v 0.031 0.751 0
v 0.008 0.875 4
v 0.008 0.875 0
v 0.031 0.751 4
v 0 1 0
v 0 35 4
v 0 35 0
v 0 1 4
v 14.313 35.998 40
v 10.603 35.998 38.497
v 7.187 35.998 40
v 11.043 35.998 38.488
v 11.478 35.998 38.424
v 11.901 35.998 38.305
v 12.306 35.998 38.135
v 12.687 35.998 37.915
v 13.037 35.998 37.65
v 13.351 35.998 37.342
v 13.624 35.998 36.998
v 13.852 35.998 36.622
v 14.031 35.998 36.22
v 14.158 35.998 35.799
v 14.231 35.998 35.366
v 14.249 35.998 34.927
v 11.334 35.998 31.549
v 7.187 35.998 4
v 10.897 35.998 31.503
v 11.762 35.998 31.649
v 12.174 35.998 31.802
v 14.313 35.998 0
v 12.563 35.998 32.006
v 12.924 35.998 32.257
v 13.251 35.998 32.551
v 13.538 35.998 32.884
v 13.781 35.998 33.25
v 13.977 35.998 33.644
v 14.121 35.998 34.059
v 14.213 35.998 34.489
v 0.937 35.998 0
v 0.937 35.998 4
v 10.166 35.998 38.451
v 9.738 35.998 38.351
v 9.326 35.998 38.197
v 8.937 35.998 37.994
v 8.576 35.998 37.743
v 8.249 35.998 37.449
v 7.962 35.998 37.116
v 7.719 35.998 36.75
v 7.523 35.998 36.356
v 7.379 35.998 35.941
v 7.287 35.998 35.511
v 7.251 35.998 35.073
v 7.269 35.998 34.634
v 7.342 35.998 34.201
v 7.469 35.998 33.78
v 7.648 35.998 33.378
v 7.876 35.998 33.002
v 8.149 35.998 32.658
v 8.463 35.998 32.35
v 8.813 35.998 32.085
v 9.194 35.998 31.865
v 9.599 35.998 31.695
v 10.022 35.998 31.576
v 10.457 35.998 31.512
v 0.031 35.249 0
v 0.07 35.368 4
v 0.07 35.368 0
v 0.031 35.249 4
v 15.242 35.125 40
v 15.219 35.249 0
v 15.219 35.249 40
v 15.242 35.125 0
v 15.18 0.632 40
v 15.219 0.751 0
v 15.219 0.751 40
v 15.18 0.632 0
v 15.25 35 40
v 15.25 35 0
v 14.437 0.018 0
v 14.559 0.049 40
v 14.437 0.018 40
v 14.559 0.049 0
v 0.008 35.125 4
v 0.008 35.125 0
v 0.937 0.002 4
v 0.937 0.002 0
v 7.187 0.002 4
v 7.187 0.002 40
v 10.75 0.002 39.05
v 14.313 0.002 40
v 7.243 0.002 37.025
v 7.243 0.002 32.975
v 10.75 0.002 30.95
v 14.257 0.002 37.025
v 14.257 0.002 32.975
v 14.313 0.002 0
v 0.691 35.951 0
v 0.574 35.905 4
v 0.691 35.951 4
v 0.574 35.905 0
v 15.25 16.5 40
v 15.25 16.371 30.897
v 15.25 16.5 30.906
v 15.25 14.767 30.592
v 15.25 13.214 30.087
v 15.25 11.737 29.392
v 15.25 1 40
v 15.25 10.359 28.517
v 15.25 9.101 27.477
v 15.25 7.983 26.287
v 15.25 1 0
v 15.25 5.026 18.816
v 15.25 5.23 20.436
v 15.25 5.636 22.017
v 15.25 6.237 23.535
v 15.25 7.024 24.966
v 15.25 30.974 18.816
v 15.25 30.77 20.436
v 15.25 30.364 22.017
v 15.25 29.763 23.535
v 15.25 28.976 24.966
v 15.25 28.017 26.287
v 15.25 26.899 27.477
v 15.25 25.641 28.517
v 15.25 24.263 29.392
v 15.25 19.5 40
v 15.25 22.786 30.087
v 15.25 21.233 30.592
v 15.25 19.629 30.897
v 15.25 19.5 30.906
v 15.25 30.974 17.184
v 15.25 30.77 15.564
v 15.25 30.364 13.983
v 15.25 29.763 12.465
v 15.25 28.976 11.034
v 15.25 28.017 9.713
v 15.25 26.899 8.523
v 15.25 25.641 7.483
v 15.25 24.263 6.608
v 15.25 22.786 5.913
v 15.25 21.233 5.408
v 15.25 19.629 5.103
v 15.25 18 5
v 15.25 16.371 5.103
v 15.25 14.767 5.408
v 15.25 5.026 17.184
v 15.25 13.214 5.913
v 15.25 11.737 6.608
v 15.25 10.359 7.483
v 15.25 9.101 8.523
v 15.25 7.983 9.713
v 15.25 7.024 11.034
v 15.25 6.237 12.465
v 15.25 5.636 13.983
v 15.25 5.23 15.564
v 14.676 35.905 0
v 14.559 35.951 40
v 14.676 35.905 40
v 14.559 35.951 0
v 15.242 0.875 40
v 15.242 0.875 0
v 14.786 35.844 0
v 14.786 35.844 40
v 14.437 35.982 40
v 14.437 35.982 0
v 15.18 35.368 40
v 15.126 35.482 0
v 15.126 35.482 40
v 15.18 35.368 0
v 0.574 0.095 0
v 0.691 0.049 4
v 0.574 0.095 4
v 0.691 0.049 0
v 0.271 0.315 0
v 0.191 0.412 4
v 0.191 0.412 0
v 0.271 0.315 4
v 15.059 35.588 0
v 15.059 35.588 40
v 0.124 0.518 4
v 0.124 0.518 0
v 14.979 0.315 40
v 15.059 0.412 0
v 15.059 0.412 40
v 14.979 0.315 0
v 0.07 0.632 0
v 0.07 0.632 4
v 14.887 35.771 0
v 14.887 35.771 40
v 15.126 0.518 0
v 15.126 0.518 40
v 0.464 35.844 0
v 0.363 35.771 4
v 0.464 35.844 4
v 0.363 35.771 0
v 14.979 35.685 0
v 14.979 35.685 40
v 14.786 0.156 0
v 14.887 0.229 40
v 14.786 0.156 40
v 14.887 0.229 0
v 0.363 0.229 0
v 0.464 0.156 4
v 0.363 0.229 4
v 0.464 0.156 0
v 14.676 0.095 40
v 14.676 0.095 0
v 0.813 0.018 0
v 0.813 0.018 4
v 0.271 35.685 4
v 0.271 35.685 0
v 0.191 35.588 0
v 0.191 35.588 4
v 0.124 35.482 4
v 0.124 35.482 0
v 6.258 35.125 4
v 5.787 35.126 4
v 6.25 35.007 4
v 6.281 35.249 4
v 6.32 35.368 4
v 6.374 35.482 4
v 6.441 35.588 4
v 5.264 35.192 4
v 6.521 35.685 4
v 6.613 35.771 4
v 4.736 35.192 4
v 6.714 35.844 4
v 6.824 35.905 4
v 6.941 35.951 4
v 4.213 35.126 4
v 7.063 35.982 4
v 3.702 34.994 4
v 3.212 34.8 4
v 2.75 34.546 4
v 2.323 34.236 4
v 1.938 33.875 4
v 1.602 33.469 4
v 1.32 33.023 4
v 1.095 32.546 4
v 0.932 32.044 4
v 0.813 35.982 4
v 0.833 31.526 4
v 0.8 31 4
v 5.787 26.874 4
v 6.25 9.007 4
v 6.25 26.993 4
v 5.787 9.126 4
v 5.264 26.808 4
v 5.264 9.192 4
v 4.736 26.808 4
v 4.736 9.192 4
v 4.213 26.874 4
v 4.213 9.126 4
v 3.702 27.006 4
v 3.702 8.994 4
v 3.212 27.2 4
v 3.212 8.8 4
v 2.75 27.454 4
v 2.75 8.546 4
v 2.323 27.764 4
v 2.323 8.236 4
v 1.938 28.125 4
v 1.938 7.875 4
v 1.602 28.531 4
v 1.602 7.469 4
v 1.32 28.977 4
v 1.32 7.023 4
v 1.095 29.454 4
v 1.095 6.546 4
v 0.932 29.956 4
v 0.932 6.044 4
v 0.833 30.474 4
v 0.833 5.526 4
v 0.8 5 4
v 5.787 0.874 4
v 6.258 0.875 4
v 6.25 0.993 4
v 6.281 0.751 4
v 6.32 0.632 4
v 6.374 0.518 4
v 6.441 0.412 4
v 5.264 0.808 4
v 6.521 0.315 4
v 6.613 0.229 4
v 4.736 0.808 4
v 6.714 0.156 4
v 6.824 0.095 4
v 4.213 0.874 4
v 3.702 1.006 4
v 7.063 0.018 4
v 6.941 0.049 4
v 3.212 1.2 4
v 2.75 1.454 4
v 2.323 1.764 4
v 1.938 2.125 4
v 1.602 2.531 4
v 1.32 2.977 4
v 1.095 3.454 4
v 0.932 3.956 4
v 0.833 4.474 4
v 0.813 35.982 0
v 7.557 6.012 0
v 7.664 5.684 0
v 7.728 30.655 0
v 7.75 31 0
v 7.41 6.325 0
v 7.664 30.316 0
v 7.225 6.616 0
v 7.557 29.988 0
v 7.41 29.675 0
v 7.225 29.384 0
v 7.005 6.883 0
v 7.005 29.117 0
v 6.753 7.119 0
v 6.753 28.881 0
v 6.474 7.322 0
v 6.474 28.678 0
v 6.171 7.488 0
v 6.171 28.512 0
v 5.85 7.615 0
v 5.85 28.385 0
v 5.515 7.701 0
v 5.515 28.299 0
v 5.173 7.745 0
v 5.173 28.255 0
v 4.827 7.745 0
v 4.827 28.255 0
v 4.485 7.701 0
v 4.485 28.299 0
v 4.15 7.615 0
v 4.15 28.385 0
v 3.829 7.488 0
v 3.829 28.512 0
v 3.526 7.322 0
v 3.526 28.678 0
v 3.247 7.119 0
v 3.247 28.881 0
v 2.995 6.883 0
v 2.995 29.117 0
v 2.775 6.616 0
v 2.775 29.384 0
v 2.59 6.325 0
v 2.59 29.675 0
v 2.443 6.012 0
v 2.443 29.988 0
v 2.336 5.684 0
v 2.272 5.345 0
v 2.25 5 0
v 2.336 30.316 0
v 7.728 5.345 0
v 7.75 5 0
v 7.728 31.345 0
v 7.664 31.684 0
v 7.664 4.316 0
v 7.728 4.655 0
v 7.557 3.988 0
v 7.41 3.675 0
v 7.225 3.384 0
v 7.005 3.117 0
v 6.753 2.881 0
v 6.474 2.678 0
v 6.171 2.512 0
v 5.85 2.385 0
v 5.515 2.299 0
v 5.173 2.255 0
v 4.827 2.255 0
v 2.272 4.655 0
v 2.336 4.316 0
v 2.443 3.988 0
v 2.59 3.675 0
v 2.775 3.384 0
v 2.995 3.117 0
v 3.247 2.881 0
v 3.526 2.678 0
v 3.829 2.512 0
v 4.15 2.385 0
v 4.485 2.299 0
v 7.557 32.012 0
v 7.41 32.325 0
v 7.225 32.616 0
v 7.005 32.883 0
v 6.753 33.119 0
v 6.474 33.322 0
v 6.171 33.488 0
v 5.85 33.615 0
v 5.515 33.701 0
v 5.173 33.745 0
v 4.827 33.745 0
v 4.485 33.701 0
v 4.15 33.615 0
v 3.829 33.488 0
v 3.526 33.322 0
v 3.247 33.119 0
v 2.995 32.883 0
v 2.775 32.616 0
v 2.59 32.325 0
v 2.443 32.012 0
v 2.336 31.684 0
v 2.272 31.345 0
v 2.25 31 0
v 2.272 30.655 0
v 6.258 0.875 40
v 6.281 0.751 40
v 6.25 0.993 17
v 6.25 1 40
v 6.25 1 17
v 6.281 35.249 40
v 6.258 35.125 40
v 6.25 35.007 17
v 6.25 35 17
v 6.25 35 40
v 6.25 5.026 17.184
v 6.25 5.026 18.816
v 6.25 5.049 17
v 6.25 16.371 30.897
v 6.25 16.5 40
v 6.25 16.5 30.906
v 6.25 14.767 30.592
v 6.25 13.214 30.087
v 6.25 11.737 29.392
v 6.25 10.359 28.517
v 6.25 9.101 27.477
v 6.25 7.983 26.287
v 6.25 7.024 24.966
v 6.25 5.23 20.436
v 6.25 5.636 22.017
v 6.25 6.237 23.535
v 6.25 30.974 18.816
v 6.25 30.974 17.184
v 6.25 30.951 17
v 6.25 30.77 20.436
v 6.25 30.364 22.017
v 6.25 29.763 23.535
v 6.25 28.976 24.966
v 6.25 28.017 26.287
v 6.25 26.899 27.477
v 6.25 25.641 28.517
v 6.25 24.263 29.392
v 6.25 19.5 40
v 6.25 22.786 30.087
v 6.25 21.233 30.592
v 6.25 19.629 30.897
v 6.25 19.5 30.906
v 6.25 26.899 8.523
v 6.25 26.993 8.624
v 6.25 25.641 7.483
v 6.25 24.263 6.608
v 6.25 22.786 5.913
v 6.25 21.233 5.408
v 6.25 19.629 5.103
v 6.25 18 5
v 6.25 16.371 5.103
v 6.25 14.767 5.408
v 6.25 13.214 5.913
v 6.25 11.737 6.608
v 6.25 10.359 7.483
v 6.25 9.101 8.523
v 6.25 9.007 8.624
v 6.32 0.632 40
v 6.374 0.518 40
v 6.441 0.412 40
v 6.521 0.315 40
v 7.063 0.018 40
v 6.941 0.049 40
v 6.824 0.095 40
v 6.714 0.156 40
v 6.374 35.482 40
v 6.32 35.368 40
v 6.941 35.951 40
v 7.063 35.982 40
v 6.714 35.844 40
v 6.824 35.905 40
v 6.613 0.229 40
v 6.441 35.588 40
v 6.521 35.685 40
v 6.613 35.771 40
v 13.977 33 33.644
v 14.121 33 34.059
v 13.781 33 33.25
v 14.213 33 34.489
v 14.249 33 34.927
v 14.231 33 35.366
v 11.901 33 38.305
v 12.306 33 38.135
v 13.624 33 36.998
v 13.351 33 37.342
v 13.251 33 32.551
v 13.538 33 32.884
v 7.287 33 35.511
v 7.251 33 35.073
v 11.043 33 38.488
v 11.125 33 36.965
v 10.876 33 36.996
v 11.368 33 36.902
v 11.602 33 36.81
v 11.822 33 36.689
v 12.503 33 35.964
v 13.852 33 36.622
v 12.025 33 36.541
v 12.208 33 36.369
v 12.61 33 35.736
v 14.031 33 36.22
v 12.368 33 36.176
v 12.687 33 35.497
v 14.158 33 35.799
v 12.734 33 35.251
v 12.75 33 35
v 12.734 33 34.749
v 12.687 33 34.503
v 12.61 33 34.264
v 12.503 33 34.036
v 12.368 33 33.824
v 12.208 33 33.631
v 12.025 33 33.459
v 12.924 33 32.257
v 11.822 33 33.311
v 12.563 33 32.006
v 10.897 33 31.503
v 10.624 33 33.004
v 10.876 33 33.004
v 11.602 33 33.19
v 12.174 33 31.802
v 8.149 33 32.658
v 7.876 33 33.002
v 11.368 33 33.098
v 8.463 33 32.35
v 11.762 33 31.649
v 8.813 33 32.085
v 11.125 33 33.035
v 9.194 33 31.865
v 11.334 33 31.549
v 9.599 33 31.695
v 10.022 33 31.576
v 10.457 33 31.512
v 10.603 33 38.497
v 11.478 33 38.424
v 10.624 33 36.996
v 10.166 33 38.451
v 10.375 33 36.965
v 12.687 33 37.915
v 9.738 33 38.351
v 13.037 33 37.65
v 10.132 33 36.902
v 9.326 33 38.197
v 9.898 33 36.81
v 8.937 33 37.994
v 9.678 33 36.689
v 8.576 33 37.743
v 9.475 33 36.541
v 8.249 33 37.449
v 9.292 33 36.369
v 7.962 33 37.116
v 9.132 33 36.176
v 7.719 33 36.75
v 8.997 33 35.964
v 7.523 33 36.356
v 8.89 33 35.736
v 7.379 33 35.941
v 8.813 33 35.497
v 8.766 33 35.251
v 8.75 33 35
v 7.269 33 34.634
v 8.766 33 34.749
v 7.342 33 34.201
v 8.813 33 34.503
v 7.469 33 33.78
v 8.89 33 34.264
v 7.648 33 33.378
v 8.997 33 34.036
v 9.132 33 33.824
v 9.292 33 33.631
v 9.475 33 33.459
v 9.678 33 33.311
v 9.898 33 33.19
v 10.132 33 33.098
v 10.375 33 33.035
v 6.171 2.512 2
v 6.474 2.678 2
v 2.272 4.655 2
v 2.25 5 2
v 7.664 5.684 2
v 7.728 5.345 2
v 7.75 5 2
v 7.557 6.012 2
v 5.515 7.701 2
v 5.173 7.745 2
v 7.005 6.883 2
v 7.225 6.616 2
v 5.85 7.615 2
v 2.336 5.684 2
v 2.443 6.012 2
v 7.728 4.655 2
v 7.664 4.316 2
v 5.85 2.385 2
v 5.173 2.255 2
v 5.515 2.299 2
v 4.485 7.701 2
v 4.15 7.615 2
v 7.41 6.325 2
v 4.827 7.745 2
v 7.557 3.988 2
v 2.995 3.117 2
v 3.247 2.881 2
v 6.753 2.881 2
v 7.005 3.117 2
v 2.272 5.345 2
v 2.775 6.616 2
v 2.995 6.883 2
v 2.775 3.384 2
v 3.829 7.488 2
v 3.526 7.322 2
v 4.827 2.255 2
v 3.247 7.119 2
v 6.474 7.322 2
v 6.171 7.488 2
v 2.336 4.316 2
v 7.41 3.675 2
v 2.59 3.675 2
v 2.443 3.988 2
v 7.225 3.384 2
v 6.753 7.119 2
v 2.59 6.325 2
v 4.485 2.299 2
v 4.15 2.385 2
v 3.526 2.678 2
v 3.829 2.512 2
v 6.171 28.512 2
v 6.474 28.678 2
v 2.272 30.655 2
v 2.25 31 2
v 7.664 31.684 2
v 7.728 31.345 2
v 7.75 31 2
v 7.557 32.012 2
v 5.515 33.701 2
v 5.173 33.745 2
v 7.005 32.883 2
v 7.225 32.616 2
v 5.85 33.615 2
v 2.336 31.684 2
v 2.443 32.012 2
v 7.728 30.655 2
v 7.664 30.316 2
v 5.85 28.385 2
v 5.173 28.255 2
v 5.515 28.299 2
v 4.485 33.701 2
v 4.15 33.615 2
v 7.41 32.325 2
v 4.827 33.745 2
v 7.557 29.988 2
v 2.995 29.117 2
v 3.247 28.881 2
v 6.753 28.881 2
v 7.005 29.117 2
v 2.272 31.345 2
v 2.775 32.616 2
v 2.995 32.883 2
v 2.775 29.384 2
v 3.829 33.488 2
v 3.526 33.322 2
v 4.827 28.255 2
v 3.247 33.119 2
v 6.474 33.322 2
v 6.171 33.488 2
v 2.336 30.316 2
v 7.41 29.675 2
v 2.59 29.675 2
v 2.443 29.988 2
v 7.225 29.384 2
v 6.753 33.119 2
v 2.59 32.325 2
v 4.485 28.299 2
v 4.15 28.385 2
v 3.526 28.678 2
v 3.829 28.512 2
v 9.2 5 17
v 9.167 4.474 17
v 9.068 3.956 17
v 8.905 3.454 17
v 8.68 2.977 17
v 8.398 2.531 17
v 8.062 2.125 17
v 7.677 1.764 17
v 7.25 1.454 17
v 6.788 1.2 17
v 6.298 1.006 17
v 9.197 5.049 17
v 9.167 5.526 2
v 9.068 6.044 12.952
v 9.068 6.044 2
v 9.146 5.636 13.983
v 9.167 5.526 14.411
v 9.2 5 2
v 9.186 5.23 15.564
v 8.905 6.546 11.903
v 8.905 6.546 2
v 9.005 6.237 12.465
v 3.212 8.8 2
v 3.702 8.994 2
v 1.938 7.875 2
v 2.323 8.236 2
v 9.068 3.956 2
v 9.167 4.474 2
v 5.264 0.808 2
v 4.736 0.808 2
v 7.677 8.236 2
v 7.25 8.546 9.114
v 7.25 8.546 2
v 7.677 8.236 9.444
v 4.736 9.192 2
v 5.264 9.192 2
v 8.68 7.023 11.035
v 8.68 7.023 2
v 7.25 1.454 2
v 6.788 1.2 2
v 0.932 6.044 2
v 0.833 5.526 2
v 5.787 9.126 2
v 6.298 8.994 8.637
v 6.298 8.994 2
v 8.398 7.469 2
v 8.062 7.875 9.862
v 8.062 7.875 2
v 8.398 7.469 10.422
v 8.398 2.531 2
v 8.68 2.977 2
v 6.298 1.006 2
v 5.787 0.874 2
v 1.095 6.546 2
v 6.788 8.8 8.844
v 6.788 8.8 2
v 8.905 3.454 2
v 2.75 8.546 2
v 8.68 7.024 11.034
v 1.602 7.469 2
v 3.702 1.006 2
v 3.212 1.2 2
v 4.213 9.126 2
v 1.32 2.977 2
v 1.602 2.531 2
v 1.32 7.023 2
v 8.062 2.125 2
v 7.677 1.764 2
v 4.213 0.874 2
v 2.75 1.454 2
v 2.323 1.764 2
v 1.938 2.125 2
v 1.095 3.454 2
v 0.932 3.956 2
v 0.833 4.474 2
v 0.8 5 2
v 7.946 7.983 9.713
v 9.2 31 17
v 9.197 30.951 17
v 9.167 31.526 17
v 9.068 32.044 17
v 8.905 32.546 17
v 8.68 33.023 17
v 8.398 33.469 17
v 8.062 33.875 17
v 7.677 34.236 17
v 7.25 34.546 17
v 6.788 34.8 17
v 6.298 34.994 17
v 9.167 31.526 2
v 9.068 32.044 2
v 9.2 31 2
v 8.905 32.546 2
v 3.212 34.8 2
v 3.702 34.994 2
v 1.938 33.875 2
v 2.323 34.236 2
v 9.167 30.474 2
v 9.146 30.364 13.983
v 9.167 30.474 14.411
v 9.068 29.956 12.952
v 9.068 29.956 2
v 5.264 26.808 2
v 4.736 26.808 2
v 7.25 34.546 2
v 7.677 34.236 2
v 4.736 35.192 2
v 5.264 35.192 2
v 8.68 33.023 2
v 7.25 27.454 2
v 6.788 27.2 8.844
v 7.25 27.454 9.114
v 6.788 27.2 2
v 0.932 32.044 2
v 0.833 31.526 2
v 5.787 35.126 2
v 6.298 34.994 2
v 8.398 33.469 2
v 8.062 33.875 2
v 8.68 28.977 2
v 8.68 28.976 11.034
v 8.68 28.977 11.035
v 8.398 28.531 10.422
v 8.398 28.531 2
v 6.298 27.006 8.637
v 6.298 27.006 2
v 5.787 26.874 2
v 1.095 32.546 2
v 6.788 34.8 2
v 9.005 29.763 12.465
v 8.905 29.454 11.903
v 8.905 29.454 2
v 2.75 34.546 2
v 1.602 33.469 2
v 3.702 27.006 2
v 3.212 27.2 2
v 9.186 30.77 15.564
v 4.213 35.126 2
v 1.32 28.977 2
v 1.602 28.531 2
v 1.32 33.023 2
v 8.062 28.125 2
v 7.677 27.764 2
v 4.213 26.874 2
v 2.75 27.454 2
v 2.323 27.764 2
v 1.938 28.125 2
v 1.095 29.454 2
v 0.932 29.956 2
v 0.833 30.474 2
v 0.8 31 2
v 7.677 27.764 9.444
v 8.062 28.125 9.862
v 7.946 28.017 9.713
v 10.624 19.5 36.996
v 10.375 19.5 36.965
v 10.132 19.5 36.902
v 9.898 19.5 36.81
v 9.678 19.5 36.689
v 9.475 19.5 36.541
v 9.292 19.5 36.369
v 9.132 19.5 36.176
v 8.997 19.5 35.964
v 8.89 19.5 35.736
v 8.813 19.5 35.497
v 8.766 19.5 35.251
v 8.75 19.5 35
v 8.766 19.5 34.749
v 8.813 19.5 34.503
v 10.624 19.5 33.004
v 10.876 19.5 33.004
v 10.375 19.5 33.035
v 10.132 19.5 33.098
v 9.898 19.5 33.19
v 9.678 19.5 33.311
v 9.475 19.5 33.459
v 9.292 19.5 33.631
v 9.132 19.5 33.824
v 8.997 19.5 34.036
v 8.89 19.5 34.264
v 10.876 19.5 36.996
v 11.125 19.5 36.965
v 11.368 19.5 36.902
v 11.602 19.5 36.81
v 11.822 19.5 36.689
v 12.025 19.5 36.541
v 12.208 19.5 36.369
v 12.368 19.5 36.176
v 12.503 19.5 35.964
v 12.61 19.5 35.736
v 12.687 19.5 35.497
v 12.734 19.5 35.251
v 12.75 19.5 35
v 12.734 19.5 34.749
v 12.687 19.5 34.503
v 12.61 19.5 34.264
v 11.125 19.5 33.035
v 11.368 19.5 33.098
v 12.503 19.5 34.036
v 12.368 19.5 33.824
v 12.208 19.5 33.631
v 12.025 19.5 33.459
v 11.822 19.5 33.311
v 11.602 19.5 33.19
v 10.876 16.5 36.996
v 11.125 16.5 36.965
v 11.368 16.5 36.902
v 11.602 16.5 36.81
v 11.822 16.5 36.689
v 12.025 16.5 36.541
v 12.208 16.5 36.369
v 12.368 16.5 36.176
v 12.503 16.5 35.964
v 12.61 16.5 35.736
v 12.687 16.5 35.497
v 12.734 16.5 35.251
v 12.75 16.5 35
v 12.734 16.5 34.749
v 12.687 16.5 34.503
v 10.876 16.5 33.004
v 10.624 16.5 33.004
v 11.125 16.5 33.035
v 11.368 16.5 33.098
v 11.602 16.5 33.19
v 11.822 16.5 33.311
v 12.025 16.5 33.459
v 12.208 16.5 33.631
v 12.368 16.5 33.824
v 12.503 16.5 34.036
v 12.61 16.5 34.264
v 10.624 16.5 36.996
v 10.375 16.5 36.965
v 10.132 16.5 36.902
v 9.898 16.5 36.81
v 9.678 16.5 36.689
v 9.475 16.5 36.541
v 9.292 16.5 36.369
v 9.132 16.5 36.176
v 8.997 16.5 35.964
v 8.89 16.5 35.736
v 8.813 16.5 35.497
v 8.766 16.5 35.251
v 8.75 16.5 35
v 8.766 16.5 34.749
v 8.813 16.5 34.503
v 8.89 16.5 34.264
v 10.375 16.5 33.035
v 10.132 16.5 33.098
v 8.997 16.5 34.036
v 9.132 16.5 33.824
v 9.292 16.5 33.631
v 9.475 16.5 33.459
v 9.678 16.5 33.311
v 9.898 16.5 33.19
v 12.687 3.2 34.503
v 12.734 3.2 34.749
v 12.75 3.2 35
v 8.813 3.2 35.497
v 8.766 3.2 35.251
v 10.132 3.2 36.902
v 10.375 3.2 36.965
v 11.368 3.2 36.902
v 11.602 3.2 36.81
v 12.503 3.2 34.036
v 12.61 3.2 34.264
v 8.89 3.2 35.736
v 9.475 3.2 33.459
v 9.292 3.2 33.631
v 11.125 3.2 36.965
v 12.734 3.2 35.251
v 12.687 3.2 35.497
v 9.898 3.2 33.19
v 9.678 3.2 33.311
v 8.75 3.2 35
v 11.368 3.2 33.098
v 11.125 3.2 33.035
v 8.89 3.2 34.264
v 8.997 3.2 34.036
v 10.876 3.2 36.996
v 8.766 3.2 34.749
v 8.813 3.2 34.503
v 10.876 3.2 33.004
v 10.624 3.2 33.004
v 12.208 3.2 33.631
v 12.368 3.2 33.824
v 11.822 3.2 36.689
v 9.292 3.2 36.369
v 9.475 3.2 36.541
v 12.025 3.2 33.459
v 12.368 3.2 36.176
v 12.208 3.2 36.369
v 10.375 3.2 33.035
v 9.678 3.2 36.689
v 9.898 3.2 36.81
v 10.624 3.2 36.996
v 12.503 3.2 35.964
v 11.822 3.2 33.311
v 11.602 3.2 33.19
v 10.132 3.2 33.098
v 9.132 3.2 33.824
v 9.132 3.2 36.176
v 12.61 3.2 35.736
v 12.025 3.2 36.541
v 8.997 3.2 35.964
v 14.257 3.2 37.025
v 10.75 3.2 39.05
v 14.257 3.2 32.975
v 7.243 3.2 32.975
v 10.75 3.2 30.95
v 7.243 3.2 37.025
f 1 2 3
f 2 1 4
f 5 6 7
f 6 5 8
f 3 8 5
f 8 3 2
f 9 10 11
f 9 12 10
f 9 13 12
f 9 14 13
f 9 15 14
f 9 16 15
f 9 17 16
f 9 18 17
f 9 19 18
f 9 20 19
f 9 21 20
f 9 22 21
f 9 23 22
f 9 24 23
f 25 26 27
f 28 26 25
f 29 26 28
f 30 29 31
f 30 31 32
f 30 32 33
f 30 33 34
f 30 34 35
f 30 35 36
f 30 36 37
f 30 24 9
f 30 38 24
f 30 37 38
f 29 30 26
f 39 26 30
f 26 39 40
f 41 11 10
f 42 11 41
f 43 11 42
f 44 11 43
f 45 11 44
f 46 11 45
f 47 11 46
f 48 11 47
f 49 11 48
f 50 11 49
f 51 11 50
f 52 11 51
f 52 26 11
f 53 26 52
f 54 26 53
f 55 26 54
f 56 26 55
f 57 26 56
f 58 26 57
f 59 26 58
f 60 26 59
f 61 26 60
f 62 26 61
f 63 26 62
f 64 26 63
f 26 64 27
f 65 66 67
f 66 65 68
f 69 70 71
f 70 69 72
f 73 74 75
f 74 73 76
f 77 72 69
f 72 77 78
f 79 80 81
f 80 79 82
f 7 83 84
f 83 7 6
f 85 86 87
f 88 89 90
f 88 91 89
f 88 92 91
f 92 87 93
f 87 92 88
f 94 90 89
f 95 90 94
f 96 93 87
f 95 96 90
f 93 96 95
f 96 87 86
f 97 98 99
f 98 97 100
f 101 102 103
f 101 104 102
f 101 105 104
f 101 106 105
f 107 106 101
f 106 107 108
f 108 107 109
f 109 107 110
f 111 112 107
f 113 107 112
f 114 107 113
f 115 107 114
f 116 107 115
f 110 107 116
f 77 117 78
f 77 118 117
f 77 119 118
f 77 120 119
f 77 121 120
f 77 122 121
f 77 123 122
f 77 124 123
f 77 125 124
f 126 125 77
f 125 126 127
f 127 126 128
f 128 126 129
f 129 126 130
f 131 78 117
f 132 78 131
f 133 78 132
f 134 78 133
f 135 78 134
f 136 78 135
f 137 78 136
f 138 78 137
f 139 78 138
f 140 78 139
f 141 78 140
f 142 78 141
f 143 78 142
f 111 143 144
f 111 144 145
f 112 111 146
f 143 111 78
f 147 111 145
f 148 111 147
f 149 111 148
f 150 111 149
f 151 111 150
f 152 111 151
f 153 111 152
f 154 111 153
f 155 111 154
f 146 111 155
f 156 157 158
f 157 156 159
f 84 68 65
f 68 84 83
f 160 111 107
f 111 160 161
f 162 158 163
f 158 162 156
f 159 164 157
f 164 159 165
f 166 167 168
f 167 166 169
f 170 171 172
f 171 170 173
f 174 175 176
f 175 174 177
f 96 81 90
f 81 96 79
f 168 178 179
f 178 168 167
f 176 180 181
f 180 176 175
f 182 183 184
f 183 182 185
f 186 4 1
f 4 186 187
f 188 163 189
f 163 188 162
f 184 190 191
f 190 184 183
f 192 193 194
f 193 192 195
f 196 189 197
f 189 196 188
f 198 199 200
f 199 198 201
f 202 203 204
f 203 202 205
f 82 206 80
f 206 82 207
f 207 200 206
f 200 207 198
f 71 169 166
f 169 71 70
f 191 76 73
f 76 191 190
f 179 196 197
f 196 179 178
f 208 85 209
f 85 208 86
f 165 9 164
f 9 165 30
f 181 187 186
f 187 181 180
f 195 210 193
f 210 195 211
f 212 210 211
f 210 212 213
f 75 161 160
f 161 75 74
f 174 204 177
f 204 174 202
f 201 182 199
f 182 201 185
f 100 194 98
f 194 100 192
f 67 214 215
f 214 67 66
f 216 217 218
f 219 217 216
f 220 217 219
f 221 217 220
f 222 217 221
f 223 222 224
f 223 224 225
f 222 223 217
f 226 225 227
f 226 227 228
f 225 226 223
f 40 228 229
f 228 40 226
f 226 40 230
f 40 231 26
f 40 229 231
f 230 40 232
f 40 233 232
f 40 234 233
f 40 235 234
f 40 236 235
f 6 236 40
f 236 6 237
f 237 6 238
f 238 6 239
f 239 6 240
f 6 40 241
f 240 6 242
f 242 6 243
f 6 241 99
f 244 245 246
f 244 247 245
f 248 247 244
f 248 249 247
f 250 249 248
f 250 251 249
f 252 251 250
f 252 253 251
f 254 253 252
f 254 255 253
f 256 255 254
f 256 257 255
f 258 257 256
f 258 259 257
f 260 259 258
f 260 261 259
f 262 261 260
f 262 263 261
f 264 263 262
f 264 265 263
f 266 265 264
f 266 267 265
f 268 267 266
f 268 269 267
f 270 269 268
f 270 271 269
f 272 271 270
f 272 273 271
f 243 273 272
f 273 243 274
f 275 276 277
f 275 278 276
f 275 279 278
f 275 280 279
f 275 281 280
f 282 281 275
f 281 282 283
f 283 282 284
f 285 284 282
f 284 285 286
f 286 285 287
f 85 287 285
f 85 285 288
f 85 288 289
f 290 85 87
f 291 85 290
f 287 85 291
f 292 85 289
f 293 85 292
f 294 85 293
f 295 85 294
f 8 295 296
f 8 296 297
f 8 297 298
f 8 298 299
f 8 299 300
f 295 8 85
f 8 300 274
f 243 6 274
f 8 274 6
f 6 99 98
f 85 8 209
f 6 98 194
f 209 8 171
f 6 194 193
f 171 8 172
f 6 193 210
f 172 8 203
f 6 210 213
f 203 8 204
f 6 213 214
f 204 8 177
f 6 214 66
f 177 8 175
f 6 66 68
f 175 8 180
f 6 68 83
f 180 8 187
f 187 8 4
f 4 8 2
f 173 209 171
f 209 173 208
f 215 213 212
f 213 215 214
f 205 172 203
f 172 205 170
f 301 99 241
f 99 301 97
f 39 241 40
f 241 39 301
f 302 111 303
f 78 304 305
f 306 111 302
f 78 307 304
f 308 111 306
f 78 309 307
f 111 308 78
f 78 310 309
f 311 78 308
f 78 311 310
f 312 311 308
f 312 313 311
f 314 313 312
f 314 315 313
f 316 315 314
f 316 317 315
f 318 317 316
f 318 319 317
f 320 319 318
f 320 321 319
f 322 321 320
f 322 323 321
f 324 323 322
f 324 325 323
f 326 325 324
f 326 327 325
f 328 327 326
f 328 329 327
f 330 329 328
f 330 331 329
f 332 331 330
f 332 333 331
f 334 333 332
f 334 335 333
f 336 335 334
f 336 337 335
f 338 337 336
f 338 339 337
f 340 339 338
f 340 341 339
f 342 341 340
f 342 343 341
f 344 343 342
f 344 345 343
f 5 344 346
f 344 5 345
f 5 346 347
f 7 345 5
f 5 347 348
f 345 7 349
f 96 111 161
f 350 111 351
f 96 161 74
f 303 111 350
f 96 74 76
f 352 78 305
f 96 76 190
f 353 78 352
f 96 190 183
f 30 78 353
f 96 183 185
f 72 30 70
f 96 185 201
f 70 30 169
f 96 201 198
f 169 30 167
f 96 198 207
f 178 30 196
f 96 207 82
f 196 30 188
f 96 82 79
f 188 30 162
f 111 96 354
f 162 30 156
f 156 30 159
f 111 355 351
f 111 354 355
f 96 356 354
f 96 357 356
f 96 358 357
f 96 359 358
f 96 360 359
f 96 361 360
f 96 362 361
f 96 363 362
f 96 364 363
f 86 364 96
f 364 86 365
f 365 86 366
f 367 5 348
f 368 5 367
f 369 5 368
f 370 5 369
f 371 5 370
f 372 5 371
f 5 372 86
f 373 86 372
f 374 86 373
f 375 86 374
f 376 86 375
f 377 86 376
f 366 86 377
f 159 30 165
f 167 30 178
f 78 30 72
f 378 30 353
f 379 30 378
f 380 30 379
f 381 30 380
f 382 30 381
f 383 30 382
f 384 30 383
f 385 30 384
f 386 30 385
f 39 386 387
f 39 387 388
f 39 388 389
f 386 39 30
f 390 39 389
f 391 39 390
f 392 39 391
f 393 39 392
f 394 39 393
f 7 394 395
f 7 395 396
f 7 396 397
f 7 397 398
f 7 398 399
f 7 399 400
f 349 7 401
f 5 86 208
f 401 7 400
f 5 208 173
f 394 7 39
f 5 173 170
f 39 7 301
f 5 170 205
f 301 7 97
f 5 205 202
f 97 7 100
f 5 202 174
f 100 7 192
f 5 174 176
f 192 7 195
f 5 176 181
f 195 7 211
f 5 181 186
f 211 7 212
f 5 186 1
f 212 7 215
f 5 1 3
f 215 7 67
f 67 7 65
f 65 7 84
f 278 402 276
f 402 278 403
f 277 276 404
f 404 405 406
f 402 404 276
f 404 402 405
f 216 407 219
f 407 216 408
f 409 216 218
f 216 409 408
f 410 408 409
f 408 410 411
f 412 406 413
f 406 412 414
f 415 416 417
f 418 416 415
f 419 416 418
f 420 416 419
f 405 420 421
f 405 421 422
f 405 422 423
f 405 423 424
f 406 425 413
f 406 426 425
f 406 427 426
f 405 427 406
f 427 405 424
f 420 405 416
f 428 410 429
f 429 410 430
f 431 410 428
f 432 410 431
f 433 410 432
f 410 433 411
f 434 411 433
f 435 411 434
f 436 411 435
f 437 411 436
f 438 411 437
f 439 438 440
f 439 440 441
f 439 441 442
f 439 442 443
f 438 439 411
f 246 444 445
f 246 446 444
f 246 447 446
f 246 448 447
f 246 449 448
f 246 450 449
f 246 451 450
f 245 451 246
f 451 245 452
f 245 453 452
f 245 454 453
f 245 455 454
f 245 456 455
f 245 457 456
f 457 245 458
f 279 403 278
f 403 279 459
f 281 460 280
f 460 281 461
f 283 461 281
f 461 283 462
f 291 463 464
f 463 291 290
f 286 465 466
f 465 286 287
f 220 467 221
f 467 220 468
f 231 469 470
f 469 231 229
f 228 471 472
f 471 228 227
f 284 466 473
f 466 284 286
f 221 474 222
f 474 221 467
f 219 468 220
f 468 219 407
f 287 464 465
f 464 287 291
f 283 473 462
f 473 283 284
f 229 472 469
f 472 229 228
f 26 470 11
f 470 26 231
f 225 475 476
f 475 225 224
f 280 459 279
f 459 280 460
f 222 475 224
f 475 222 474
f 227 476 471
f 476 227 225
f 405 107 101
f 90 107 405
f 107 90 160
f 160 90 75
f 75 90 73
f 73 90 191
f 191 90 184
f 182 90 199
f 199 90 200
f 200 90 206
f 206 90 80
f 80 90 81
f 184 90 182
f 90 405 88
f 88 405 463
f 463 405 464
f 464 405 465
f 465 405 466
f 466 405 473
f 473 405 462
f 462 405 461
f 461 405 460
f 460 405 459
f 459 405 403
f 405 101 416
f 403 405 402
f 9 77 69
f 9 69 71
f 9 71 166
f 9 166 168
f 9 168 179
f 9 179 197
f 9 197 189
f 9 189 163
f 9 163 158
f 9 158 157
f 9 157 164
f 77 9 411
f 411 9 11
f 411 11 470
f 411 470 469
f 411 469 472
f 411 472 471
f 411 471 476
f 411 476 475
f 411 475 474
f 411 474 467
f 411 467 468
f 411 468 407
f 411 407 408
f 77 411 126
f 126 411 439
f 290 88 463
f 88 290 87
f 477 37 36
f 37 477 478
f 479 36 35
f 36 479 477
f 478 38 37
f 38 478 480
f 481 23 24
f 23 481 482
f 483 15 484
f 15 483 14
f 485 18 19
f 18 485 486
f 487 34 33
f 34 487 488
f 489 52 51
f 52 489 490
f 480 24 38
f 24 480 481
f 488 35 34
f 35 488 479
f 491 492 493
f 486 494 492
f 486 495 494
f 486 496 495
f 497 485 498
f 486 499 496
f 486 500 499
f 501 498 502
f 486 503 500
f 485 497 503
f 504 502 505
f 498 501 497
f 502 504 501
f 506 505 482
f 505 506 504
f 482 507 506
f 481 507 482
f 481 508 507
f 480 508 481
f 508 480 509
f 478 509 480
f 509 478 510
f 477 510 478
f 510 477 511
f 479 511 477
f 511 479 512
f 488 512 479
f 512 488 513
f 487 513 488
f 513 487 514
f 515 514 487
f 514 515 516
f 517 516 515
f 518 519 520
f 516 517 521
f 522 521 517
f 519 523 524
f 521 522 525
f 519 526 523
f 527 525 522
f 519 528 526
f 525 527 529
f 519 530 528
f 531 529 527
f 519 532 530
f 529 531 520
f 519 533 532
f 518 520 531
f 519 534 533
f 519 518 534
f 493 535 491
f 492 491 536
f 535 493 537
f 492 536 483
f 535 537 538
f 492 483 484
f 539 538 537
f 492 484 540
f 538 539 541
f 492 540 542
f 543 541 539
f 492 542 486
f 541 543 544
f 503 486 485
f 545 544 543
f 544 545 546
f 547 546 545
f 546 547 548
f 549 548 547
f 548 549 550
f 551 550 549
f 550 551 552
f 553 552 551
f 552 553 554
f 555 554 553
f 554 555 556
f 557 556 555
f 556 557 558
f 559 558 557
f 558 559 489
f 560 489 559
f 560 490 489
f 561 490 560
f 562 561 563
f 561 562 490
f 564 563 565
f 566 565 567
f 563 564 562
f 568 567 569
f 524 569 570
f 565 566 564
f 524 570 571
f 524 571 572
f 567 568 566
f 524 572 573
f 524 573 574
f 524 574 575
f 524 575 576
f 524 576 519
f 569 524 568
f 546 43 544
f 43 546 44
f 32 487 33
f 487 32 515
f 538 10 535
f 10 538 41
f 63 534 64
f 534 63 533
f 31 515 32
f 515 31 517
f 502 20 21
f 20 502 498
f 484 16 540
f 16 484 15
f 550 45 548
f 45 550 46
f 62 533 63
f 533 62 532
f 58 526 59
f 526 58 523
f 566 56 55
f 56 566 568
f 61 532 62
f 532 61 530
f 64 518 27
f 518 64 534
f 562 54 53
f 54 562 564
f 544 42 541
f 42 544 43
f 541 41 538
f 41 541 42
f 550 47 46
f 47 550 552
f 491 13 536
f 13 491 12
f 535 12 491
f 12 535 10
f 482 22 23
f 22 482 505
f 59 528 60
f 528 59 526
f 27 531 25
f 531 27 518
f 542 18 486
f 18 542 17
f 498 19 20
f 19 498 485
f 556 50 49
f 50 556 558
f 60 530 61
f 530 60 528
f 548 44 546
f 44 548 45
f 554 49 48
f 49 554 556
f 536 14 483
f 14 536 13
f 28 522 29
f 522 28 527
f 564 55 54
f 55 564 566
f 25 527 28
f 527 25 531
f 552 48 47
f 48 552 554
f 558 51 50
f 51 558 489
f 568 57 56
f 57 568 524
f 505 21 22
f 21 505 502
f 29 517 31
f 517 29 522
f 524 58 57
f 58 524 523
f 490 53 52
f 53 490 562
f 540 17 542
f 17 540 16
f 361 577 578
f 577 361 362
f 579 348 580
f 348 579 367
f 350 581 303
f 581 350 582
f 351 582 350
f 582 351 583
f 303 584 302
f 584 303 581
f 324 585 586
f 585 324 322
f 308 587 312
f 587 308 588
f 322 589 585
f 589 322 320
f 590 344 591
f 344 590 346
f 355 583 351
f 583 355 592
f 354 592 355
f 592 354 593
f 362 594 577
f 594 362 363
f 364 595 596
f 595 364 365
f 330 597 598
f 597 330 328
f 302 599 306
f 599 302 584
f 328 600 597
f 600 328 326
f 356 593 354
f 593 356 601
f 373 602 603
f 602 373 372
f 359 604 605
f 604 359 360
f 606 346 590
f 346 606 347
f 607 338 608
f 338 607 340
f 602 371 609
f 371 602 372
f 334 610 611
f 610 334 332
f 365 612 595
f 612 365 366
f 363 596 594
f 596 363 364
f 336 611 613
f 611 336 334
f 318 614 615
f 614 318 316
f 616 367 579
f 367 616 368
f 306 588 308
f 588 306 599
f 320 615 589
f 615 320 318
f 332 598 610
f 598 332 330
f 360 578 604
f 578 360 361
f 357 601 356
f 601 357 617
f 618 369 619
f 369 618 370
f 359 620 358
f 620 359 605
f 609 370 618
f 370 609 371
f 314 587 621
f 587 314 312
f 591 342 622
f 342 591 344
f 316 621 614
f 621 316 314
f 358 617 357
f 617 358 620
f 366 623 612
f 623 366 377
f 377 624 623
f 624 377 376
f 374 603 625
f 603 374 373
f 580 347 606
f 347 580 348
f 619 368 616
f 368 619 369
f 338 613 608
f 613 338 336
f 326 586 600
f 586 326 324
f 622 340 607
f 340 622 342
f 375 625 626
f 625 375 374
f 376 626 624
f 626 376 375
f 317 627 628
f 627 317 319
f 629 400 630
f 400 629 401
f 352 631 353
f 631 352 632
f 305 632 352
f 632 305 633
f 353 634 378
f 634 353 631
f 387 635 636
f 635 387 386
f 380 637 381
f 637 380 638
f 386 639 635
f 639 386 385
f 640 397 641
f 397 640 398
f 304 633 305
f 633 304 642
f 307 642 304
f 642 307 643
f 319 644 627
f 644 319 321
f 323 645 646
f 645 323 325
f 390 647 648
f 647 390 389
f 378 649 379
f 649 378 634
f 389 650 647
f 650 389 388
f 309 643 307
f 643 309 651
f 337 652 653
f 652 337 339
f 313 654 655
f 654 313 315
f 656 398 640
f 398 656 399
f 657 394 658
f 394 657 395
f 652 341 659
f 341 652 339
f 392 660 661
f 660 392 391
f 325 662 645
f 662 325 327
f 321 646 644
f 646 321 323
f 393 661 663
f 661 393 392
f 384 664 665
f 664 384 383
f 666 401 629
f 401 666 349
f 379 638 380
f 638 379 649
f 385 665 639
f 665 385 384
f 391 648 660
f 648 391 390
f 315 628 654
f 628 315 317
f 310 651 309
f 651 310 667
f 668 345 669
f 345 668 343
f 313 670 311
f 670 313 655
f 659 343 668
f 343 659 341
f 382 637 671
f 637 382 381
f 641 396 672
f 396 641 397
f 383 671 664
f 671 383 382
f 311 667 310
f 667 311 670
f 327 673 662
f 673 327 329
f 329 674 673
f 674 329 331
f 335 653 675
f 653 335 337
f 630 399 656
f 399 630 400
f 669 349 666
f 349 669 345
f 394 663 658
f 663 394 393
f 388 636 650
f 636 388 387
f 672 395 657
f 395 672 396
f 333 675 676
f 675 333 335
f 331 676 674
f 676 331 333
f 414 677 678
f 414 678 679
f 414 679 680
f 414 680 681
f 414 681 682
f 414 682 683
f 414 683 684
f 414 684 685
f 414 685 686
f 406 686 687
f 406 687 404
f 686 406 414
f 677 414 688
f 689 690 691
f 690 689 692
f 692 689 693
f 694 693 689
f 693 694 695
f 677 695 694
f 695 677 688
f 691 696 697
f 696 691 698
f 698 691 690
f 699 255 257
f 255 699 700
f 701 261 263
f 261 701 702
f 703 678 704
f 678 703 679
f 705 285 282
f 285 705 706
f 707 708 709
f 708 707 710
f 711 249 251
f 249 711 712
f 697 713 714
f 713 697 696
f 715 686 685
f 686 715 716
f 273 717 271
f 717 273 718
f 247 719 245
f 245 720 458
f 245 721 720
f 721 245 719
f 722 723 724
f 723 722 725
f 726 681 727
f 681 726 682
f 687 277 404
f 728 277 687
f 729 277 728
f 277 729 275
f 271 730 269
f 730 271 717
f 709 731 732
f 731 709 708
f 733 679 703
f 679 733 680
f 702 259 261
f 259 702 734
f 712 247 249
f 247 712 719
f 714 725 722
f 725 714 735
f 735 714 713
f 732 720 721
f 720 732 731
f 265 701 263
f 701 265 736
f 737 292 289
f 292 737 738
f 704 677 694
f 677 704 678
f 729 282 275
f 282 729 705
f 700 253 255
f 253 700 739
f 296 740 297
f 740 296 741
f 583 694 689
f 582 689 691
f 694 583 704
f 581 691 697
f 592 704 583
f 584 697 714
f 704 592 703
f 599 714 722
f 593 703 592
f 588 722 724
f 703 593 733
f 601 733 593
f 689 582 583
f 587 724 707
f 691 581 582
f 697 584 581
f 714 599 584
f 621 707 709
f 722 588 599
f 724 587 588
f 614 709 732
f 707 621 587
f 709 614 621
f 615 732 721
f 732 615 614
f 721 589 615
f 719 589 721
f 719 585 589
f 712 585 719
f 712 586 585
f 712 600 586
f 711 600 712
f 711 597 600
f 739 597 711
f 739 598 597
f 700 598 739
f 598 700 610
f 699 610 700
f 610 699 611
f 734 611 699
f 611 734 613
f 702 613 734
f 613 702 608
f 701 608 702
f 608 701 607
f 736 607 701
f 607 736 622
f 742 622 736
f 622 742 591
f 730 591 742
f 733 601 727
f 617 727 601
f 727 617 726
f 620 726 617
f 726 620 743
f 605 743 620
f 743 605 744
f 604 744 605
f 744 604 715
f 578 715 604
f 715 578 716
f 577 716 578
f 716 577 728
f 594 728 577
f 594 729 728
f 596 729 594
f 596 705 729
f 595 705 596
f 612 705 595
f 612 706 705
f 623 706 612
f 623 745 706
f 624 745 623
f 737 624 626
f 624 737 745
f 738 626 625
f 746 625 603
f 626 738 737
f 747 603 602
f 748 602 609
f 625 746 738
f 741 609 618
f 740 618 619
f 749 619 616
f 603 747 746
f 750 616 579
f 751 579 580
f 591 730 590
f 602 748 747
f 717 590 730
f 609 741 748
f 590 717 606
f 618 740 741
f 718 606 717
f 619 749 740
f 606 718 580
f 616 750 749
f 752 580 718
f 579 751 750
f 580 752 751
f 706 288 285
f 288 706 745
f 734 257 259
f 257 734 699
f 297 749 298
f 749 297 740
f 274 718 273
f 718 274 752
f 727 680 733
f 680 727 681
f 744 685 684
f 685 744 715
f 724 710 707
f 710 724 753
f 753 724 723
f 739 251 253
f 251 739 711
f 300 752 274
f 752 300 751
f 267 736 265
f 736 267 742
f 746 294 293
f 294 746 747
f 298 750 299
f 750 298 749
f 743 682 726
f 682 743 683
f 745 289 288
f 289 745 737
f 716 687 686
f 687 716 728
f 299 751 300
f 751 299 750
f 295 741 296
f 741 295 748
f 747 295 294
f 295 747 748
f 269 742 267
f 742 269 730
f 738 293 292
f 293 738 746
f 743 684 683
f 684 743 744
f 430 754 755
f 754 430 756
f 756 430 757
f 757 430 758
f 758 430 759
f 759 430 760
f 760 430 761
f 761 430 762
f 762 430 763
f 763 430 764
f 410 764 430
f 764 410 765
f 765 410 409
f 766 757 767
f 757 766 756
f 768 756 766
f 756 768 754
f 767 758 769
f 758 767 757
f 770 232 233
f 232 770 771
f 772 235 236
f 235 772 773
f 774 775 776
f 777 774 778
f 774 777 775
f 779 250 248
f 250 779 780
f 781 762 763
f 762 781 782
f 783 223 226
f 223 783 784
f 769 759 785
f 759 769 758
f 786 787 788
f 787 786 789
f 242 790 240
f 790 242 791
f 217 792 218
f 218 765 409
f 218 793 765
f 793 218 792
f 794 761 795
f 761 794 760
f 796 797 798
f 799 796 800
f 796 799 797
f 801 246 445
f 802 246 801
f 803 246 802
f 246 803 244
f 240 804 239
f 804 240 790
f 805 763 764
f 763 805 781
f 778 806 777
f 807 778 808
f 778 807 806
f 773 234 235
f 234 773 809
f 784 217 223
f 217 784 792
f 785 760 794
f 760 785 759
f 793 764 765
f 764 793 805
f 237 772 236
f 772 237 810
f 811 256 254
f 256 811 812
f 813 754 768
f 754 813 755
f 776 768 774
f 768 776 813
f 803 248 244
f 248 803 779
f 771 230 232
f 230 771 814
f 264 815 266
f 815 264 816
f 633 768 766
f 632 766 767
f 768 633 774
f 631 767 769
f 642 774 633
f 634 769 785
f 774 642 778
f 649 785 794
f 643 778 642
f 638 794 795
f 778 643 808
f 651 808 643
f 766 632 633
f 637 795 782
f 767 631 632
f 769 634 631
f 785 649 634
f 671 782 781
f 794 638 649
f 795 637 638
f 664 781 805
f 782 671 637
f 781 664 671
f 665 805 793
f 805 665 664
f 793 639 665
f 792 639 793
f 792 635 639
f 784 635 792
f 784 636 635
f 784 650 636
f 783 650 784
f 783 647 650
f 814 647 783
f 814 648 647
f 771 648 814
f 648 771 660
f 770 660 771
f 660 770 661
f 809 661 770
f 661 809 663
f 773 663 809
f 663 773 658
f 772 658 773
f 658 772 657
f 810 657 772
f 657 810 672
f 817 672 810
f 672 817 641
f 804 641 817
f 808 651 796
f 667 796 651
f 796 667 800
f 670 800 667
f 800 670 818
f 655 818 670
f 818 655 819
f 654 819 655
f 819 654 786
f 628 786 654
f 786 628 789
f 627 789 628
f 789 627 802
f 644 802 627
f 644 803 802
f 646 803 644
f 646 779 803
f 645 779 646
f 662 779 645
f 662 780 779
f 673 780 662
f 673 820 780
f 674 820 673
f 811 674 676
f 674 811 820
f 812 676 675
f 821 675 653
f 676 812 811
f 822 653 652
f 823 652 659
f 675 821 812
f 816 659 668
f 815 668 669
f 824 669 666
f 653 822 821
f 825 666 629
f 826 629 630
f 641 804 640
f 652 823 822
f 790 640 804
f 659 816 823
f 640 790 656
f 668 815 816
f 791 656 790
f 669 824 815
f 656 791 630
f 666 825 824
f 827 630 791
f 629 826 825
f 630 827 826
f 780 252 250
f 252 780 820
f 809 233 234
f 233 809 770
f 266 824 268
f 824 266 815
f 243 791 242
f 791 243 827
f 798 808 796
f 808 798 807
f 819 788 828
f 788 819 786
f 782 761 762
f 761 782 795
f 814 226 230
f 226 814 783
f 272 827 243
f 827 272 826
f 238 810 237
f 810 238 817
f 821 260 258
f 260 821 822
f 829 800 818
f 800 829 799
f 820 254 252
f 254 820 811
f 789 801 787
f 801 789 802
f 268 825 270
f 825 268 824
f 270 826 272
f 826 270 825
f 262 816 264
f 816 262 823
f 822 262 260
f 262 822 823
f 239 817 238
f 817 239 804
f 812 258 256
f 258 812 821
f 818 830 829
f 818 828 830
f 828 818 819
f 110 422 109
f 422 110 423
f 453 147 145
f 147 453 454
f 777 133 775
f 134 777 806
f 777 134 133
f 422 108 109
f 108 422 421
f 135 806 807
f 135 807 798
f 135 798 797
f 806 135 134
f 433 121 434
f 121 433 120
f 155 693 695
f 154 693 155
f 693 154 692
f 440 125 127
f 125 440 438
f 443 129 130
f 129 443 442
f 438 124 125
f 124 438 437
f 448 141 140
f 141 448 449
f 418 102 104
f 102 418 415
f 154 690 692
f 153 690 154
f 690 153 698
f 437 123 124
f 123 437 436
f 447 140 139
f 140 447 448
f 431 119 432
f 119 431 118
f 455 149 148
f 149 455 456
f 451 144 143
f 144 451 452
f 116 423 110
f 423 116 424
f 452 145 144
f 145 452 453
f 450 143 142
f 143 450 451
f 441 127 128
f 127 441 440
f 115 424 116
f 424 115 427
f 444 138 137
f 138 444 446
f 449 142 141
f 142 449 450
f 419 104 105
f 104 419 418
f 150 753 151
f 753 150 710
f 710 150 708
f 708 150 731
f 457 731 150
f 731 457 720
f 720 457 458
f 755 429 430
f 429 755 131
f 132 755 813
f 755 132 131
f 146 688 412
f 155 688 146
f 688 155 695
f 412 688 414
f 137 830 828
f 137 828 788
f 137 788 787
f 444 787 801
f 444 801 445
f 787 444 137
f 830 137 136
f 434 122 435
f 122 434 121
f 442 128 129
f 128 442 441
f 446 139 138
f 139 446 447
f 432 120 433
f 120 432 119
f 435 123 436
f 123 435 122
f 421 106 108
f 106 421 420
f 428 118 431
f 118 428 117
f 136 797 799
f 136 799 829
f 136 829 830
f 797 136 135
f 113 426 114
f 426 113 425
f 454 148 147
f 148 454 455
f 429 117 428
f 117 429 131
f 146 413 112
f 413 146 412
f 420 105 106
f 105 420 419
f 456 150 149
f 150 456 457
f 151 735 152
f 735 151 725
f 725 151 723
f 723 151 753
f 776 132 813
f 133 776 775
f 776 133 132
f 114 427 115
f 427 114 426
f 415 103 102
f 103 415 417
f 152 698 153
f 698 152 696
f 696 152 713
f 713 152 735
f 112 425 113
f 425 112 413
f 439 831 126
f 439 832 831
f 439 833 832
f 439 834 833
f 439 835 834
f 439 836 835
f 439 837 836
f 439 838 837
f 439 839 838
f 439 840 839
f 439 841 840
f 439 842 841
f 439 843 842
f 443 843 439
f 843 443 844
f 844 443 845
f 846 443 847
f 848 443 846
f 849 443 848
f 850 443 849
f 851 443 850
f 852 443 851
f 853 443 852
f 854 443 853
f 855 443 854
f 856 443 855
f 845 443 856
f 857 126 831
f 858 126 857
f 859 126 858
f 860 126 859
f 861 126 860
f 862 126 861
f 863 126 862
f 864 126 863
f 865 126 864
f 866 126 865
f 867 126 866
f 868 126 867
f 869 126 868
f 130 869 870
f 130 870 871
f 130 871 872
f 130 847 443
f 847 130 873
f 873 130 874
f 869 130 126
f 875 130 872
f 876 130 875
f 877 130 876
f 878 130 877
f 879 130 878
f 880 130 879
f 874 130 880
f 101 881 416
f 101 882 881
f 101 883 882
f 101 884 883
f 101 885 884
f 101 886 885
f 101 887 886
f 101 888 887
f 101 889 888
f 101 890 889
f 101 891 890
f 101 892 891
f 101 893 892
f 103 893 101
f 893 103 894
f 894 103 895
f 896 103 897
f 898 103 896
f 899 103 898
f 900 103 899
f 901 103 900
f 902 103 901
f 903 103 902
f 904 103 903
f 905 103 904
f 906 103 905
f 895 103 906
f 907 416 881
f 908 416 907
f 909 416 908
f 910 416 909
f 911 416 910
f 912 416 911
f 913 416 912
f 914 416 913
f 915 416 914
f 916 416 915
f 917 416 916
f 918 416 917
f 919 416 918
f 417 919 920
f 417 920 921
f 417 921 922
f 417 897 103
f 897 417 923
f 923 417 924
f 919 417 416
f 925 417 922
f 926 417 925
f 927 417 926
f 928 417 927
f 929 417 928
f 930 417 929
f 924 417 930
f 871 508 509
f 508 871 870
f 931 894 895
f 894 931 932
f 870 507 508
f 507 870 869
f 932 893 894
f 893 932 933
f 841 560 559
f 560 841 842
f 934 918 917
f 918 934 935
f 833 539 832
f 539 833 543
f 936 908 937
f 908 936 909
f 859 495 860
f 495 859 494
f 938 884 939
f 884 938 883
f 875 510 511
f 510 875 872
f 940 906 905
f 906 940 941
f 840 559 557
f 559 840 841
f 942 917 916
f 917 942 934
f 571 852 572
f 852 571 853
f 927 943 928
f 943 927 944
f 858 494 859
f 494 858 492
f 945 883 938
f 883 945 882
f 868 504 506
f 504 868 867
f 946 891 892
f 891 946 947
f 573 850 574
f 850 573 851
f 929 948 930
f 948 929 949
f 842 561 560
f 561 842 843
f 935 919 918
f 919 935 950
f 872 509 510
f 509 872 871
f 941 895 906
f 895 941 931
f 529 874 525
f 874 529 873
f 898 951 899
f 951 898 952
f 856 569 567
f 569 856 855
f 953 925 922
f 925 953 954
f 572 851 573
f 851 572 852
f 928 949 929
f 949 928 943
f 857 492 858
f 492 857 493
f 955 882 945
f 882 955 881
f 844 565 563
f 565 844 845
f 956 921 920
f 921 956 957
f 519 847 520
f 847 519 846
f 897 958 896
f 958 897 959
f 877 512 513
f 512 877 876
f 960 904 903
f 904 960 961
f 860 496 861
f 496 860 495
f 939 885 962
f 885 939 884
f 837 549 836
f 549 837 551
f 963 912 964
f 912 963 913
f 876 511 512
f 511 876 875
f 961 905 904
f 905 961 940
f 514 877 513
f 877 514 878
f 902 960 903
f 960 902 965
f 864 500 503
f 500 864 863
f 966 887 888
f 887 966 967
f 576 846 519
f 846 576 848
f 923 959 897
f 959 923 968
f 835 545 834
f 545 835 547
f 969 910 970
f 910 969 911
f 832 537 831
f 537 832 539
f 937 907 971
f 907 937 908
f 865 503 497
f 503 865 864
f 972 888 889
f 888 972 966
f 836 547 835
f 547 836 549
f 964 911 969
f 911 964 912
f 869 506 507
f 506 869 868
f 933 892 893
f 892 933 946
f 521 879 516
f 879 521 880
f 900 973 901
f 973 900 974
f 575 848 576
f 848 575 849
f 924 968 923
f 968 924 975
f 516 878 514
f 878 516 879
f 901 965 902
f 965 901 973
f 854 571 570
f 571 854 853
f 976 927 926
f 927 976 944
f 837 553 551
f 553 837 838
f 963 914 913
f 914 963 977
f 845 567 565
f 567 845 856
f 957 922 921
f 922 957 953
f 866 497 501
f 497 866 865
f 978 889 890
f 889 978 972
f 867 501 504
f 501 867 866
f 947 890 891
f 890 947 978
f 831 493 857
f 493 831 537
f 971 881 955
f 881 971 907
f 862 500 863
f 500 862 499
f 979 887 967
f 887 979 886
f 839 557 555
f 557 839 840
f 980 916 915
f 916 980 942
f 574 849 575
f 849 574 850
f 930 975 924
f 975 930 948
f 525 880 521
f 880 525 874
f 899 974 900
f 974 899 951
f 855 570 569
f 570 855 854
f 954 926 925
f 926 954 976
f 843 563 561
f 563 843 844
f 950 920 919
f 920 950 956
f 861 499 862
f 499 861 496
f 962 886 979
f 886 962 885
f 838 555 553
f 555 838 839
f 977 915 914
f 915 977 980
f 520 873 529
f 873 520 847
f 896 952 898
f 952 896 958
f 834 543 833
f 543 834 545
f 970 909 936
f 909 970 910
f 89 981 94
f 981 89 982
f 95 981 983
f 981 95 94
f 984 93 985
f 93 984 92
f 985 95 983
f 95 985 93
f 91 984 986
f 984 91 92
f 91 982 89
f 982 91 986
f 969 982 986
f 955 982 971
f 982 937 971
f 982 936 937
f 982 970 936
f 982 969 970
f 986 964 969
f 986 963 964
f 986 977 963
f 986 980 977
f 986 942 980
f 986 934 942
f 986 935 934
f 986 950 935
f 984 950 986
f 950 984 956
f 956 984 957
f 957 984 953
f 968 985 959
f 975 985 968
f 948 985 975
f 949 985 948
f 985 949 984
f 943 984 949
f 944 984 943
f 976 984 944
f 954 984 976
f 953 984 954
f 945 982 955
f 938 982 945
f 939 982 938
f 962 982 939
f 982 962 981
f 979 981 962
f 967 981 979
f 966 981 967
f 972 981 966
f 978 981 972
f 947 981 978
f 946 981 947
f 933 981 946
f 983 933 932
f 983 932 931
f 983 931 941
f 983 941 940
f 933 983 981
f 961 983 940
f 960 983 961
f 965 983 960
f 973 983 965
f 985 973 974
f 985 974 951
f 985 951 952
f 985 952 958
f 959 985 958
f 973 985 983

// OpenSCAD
include <MCAD/nuts_and_bolts.scad>;

bearingHoleSpaceX=30.5;
bearingHoleSpaceY=26;
plateThickness=9;
basePlateThickness = 4;
M5HoleRadius=5.5/2;

bearingDiameter = 26;
pinionSpace=10;
rackHeight = 5;
delta = 1;
boltClearance=15;
$fn=50;

module roundedRect(size, radius)
{
    x = size[0];
    y = size[1];
    z = size[2];
    linear_extrude(height=z)
    hull()
    {
        // place 4 circles in the corners, with the given radius
        translate([radius, radius, 0])
            circle(r=radius);
        translate([x-radius, radius, 0])
            circle(r=radius);
        translate([radius, y-radius, 0])
            circle(r=radius);
        translate([x-radius, y-radius, 0])
            circle(r=radius);
    }
}

module bearing_holder()
{
  difference()
  {
    union()
    {
      roundedRect([(bearingHoleSpaceX+10 - pinionSpace)/2,bearingHoleSpaceY+10,basePlateThickness], 1);
      translate([(bearingHoleSpaceX+10 - pinionSpace)/2-plateThickness,0,0])
        roundedRect([plateThickness, bearingHoleSpaceY+10,rackHeight+bearingDiameter+9], 1);
    }
    translate([5,5,-delta]) cylinder(r=M5HoleRadius, h=basePlateThickness+delta*2);
    translate([5,5+bearingHoleSpaceY,-delta]) cylinder(r=M5HoleRadius, h=basePlateThickness+delta*2);
    translate([5,5,basePlateThickness/2]) cylinder(r=4.2, h=boltClearance);
    translate([5,5+bearingHoleSpaceY,basePlateThickness/2]) cylinder(r=4.2, h=boltClearance);
    translate([(bearingHoleSpaceX+10 - pinionSpace)/2-plateThickness-delta,(bearingHoleSpaceY+10)/2,rackHeight+bearingDiameter/2])
      rotate([0,90,0]) cylinder(r=bearingDiameter/2, h=plateThickness+delta*2);
    translate([(bearingHoleSpaceX+10 - pinionSpace)/2-plateThickness-delta,(bearingHoleSpaceY+10)/2-1.5,rackHeight+bearingDiameter-delta])
      cube([plateThickness+delta*2, 3, 8+delta*2]);  
    translate([(bearingHoleSpaceX+10 - pinionSpace)/2-plateThickness/2,-delta,rackHeight+bearingDiameter+4])
      rotate([-90,0,0])
        cylinder(r=2,h=bearingHoleSpaceY+10+delta*2);
    translate([(bearingHoleSpaceX+10 - pinionSpace)/2-plateThickness/2,0,rackHeight+bearingDiameter+4])
      rotate([-90,30,0])
        nutHole(4);
    translate([+(bearingHoleSpaceX+10 - pinionSpace)/2-plateThickness/2,bearingHoleSpaceY+7,rackHeight+bearingDiameter+4])
      rotate([90,30,0])
        boltHole(4);
  }
}

module rod_holder()
{
  rod=12;
  centerHeight=23;
  clearance = 0;
  holeSpace = 31.5;
  base = 6.5;
  depth = 14;
  aboveRod = 9;
  besideRod = 4;
  rackMountHole = 26;
  difference()
  {
    union()
    {
      translate([0,-(rod+besideRod*2)/2,0]) roundedRect([centerHeight + aboveRod + rod/2, rod+besideRod*2, depth], 1);
      translate([0,-(holeSpace+besideRod*2)/2, 0]) roundedRect([base, holeSpace+besideRod*2, depth], 1);
    }
    translate([centerHeight,0,-delta]) cylinder(d=rod+clearance,h=depth+delta*2);
    // pinch slot
    translate([centerHeight,-1,-delta])
      cube([rod/2+aboveRod+delta*2,2,depth+delta*2]);
    // pinch bolt
    translate([centerHeight+(rod+aboveRod)/2,-(rod+besideRod*2)/2-2,depth/2])
      rotate([-90,0,0])
        cylinder(r=2,h=rod+besideRod*2);
    translate([centerHeight+(aboveRod+rod)/2,-(rod+besideRod*2)/2,depth/2])
      rotate([-90,30,0])
        nutHole(4);
    translate([centerHeight+(aboveRod+rod)/2,rod/2+1,depth/2])
      rotate([90,30,0])
        boltHole(4);
    // base bolts
    translate([-delta, holeSpace/2, depth/2])
      rotate([0,90,0])
        cylinder(d=5, h=base+delta*2);
    translate([-delta, -holeSpace/2, depth/2])
      rotate([0,90,0])
        cylinder(d=5, h=base+delta*2);
    translate([centerHeight+rod/2+aboveRod-rackMountHole,0,-delta]) cylinder(d=4,h=depth+delta*2);
  }
}



bearing_holder();
